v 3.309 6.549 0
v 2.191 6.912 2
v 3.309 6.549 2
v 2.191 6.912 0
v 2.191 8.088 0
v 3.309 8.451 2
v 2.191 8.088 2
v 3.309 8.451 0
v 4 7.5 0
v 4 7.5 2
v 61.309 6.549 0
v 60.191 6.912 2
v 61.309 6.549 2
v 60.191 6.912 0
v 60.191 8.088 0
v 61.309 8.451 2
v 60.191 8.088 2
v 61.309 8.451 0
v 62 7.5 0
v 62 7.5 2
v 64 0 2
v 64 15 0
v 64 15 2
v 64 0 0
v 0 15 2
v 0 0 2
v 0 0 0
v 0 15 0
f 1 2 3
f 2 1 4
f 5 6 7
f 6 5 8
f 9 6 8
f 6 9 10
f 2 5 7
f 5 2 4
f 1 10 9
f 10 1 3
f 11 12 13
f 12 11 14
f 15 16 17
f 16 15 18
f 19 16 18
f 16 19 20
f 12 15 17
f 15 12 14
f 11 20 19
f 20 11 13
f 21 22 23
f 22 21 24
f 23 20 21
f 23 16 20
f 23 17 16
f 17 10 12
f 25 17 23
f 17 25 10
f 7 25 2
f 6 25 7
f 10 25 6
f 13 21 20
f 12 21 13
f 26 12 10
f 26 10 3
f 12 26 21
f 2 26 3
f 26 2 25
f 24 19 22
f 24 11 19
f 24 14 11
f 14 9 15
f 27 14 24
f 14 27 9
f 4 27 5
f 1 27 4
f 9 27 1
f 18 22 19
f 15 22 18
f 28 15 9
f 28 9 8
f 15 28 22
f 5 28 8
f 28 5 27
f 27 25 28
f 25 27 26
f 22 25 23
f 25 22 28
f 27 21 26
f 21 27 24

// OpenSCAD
// Zweck: assert, Strings und str() – Namensschild-Rohling mit Parameterprüfung.
label = "Werkstatt";
w = len(label) * 6 + 10;
h = 15;
assert(w > 20, "Schild zu kurz");
assert(is_string(label));
echo(str("Schild ", label, ": ", w, " x ", h, " mm"));
echo(chars = [for (c = label) c], upper_first = ord(label[0]) < 97);
difference() {
    cube([w, h, 2]);
    for (x = [3, w - 3]) translate([x, h / 2, -1]) cylinder(h = 4, d = 2);
}
